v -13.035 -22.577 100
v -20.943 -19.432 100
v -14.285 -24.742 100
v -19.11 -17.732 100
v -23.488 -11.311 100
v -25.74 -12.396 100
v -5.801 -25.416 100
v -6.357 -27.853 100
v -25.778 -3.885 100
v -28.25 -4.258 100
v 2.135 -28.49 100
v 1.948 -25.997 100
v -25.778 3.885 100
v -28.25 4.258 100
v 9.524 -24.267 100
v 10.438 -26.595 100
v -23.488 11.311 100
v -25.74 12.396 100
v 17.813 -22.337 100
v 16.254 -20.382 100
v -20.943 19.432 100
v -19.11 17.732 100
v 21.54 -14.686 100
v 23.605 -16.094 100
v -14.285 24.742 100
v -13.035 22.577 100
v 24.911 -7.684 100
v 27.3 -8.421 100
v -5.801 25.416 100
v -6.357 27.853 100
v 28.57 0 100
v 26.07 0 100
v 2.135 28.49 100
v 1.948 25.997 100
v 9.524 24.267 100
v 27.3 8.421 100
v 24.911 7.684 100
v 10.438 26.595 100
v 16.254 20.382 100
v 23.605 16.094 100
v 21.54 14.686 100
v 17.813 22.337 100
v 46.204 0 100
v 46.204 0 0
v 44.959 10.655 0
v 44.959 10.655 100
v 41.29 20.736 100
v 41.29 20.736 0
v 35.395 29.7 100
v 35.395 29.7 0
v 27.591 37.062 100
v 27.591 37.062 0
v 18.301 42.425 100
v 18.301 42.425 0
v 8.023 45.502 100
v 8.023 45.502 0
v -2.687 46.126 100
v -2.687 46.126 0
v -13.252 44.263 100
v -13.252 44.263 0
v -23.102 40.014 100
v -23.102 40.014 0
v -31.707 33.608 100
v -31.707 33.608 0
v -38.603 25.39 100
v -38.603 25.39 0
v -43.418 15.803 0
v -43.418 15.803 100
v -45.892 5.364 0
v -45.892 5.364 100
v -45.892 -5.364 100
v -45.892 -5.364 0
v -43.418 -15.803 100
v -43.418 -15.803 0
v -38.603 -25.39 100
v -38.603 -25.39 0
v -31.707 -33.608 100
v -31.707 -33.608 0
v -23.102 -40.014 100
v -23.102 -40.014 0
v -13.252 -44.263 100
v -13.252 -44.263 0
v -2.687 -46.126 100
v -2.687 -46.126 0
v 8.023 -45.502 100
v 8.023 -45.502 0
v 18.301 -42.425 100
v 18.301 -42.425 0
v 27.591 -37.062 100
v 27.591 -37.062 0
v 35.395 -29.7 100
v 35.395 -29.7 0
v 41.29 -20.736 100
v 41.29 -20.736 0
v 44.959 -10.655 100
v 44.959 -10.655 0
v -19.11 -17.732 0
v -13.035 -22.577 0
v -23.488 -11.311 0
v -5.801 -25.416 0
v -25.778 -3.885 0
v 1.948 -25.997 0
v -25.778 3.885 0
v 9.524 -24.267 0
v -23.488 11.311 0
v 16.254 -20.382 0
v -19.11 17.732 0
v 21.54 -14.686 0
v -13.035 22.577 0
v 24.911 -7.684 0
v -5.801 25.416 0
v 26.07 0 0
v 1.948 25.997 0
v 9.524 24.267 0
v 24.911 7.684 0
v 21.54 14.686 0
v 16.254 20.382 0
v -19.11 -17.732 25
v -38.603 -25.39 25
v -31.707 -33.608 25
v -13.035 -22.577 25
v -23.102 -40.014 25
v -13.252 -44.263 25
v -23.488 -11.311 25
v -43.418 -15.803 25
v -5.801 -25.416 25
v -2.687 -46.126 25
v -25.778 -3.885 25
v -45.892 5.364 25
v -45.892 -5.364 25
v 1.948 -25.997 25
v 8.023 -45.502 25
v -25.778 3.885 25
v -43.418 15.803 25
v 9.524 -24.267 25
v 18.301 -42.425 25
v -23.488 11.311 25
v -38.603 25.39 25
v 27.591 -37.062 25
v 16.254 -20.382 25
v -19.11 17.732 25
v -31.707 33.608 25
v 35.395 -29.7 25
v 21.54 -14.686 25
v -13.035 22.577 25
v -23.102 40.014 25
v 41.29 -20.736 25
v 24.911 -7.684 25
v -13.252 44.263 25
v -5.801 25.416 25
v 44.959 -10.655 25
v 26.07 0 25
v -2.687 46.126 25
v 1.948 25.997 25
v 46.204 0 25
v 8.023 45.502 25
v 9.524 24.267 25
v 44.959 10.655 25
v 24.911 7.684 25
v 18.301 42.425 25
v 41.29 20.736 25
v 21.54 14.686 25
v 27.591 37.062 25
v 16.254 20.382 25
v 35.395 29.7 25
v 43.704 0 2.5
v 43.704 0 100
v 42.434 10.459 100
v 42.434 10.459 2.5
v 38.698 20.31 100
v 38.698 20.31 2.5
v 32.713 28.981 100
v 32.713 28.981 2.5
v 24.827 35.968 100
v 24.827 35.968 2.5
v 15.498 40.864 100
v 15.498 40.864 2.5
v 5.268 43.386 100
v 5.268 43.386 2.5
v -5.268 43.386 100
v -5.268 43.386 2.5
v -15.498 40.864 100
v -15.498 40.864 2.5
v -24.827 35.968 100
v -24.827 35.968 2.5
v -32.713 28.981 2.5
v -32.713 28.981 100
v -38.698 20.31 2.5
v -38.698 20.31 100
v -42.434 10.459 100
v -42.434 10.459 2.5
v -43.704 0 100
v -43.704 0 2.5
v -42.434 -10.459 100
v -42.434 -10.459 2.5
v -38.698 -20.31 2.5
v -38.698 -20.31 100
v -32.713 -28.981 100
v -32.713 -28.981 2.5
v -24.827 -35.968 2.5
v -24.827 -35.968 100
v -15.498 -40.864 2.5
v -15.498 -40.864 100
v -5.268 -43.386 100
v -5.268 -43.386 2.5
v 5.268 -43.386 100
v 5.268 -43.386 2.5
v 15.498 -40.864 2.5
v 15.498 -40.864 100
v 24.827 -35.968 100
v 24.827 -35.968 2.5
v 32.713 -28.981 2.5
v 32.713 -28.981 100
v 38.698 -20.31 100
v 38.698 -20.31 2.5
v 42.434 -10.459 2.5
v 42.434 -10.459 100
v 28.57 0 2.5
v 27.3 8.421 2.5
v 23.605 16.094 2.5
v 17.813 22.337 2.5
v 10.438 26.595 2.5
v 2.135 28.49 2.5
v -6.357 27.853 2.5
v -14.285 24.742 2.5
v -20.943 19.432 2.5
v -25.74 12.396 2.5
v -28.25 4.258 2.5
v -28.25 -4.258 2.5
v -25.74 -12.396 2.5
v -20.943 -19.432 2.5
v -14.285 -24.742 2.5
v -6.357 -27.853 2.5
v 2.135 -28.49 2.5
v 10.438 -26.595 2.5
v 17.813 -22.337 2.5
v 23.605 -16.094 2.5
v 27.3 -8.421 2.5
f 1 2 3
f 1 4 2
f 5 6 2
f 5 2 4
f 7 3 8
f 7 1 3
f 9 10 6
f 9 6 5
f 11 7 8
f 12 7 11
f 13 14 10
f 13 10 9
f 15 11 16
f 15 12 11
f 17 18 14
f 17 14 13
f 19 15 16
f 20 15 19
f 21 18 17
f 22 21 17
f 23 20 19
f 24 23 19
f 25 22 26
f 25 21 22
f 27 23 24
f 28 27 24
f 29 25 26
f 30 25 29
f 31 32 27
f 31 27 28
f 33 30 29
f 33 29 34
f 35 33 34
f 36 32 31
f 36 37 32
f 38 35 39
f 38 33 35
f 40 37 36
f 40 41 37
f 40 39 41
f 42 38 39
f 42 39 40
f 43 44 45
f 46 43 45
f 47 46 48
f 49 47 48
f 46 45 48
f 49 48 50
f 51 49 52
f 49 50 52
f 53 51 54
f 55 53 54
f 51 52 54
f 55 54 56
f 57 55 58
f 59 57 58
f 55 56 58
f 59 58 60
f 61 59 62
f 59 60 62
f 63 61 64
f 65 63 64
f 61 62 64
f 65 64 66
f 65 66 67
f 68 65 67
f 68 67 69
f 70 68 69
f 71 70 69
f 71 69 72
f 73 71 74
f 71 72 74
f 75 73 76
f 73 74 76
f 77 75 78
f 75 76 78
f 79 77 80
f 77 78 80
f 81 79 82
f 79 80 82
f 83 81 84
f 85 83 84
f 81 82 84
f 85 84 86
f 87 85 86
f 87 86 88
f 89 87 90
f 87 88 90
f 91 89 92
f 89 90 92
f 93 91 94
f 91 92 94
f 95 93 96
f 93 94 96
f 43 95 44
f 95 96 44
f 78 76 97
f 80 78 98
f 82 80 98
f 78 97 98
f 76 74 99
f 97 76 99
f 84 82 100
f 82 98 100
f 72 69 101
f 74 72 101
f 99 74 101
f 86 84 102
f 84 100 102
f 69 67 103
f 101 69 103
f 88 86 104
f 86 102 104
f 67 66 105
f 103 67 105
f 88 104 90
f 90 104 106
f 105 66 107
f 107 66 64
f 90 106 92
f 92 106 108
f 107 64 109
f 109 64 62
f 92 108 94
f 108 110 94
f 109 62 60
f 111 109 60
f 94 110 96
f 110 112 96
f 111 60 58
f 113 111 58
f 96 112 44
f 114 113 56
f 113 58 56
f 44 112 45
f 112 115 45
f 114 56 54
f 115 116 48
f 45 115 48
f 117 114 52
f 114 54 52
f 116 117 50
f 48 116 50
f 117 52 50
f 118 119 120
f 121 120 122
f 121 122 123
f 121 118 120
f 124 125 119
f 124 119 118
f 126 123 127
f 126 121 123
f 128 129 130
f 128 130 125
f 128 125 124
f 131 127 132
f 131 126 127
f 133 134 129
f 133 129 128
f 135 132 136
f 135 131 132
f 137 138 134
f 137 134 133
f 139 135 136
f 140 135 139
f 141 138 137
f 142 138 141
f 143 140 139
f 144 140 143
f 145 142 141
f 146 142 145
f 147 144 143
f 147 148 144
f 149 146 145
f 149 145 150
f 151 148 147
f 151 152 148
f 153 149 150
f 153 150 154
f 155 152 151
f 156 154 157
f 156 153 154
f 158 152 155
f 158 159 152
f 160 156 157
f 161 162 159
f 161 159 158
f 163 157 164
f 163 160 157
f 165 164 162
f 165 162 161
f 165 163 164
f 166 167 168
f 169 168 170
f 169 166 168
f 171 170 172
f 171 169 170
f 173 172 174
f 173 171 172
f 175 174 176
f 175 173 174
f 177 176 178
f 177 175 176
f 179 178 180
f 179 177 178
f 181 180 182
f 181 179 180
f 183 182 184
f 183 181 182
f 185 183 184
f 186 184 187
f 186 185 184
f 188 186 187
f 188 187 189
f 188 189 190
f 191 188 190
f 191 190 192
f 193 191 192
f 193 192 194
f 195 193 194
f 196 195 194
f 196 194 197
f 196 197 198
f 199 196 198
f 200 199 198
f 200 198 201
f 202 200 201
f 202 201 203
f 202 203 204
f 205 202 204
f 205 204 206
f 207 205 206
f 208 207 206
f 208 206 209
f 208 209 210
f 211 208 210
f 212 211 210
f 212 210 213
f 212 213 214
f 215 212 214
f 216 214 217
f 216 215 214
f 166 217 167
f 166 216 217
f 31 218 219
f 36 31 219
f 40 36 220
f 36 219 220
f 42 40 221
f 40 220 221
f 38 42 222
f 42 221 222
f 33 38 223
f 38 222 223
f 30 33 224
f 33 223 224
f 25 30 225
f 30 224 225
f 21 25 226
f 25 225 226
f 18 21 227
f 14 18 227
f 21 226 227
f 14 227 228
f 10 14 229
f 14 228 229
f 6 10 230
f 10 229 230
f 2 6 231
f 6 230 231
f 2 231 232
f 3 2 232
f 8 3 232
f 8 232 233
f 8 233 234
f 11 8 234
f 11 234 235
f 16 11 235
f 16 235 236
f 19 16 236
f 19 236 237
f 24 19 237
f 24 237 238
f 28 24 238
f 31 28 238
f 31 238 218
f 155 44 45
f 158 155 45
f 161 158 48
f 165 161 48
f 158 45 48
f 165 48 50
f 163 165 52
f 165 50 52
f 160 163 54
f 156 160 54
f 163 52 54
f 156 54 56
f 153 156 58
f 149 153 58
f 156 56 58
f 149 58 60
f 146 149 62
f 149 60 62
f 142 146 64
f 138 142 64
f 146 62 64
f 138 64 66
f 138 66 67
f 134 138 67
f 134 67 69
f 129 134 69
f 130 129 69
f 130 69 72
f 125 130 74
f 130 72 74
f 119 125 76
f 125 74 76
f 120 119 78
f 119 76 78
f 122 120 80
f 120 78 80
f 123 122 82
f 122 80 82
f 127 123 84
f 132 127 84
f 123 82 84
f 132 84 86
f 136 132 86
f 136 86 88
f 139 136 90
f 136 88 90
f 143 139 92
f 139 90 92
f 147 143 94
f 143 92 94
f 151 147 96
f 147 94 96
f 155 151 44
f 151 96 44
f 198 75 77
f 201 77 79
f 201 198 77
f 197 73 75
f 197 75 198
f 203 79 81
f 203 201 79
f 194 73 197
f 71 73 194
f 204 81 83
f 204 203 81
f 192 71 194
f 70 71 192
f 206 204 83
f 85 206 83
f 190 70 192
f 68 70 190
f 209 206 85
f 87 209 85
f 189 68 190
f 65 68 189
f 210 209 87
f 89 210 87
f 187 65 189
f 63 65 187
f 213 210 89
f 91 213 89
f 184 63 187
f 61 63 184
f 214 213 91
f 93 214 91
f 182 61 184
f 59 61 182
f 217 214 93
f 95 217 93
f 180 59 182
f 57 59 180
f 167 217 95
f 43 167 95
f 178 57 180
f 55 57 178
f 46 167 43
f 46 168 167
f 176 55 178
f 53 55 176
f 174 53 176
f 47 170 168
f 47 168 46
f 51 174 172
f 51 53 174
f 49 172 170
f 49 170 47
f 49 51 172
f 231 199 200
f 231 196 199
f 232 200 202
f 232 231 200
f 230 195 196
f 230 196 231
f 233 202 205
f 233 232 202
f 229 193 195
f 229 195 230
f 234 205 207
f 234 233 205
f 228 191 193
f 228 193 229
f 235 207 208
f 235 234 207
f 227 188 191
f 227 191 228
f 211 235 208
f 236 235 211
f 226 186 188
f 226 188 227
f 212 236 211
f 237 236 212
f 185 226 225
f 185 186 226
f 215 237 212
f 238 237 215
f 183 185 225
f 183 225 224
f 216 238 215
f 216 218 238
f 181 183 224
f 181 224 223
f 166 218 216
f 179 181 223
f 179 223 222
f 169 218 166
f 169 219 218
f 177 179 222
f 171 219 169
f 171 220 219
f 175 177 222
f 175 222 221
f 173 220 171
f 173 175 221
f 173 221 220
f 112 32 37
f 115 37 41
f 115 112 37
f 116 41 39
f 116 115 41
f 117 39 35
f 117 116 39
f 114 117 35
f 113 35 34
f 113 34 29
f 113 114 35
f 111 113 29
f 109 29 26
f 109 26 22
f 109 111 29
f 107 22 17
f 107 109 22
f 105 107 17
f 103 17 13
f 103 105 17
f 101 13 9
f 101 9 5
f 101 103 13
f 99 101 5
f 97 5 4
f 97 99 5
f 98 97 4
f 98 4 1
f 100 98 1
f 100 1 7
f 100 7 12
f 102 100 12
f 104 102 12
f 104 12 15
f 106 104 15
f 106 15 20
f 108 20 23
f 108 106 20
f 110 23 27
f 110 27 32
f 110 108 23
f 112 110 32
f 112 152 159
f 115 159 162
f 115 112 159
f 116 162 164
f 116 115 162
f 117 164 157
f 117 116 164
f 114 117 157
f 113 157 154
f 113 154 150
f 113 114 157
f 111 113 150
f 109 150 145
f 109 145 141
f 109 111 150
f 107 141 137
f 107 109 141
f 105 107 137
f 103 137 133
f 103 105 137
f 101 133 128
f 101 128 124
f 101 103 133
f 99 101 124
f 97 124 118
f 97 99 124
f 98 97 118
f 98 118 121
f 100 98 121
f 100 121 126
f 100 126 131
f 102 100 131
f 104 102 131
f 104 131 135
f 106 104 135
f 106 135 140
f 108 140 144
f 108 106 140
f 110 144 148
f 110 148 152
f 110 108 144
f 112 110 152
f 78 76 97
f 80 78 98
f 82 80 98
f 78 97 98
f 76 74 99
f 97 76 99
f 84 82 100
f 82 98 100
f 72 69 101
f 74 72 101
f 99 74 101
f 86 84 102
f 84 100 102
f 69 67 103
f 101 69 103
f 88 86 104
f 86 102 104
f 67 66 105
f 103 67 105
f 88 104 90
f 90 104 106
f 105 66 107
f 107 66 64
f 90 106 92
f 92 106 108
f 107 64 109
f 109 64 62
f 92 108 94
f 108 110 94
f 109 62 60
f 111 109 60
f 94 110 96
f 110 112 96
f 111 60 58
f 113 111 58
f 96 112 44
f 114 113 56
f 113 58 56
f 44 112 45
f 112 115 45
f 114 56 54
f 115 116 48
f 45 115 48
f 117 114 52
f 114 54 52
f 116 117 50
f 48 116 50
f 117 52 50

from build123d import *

# Parameters (mm, degrees)
F0_R     = 46.204257
F0_R_2   = 26.069559
F1_DEPTH = 25
F2_DEPTH = 100
F3_T     = -2.5


with BuildPart() as f1:
    # F0 (on Top) → F1 (new body)
    with BuildSketch(Plane.XY):
        Circle(F0_R)
        Circle(F0_R_2, mode=Mode.SUBTRACT)
    extrude(amount=F1_DEPTH)


with BuildPart() as f2:
    # F0 (on Top) → F2 (new body)
    with BuildSketch(Plane.XY):
        Circle(F0_R)
        Circle(F0_R_2, mode=Mode.SUBTRACT)
    extrude(amount=F2_DEPTH)

    # F3
    f3_openings = [f2.faces().sort_by_distance(p)[0] for p in [
        (-44.897403, 0, 100),
    ]]
    offset(amount=F3_T, openings=f3_openings)


solid = Compound([f1.part, f2.part])
